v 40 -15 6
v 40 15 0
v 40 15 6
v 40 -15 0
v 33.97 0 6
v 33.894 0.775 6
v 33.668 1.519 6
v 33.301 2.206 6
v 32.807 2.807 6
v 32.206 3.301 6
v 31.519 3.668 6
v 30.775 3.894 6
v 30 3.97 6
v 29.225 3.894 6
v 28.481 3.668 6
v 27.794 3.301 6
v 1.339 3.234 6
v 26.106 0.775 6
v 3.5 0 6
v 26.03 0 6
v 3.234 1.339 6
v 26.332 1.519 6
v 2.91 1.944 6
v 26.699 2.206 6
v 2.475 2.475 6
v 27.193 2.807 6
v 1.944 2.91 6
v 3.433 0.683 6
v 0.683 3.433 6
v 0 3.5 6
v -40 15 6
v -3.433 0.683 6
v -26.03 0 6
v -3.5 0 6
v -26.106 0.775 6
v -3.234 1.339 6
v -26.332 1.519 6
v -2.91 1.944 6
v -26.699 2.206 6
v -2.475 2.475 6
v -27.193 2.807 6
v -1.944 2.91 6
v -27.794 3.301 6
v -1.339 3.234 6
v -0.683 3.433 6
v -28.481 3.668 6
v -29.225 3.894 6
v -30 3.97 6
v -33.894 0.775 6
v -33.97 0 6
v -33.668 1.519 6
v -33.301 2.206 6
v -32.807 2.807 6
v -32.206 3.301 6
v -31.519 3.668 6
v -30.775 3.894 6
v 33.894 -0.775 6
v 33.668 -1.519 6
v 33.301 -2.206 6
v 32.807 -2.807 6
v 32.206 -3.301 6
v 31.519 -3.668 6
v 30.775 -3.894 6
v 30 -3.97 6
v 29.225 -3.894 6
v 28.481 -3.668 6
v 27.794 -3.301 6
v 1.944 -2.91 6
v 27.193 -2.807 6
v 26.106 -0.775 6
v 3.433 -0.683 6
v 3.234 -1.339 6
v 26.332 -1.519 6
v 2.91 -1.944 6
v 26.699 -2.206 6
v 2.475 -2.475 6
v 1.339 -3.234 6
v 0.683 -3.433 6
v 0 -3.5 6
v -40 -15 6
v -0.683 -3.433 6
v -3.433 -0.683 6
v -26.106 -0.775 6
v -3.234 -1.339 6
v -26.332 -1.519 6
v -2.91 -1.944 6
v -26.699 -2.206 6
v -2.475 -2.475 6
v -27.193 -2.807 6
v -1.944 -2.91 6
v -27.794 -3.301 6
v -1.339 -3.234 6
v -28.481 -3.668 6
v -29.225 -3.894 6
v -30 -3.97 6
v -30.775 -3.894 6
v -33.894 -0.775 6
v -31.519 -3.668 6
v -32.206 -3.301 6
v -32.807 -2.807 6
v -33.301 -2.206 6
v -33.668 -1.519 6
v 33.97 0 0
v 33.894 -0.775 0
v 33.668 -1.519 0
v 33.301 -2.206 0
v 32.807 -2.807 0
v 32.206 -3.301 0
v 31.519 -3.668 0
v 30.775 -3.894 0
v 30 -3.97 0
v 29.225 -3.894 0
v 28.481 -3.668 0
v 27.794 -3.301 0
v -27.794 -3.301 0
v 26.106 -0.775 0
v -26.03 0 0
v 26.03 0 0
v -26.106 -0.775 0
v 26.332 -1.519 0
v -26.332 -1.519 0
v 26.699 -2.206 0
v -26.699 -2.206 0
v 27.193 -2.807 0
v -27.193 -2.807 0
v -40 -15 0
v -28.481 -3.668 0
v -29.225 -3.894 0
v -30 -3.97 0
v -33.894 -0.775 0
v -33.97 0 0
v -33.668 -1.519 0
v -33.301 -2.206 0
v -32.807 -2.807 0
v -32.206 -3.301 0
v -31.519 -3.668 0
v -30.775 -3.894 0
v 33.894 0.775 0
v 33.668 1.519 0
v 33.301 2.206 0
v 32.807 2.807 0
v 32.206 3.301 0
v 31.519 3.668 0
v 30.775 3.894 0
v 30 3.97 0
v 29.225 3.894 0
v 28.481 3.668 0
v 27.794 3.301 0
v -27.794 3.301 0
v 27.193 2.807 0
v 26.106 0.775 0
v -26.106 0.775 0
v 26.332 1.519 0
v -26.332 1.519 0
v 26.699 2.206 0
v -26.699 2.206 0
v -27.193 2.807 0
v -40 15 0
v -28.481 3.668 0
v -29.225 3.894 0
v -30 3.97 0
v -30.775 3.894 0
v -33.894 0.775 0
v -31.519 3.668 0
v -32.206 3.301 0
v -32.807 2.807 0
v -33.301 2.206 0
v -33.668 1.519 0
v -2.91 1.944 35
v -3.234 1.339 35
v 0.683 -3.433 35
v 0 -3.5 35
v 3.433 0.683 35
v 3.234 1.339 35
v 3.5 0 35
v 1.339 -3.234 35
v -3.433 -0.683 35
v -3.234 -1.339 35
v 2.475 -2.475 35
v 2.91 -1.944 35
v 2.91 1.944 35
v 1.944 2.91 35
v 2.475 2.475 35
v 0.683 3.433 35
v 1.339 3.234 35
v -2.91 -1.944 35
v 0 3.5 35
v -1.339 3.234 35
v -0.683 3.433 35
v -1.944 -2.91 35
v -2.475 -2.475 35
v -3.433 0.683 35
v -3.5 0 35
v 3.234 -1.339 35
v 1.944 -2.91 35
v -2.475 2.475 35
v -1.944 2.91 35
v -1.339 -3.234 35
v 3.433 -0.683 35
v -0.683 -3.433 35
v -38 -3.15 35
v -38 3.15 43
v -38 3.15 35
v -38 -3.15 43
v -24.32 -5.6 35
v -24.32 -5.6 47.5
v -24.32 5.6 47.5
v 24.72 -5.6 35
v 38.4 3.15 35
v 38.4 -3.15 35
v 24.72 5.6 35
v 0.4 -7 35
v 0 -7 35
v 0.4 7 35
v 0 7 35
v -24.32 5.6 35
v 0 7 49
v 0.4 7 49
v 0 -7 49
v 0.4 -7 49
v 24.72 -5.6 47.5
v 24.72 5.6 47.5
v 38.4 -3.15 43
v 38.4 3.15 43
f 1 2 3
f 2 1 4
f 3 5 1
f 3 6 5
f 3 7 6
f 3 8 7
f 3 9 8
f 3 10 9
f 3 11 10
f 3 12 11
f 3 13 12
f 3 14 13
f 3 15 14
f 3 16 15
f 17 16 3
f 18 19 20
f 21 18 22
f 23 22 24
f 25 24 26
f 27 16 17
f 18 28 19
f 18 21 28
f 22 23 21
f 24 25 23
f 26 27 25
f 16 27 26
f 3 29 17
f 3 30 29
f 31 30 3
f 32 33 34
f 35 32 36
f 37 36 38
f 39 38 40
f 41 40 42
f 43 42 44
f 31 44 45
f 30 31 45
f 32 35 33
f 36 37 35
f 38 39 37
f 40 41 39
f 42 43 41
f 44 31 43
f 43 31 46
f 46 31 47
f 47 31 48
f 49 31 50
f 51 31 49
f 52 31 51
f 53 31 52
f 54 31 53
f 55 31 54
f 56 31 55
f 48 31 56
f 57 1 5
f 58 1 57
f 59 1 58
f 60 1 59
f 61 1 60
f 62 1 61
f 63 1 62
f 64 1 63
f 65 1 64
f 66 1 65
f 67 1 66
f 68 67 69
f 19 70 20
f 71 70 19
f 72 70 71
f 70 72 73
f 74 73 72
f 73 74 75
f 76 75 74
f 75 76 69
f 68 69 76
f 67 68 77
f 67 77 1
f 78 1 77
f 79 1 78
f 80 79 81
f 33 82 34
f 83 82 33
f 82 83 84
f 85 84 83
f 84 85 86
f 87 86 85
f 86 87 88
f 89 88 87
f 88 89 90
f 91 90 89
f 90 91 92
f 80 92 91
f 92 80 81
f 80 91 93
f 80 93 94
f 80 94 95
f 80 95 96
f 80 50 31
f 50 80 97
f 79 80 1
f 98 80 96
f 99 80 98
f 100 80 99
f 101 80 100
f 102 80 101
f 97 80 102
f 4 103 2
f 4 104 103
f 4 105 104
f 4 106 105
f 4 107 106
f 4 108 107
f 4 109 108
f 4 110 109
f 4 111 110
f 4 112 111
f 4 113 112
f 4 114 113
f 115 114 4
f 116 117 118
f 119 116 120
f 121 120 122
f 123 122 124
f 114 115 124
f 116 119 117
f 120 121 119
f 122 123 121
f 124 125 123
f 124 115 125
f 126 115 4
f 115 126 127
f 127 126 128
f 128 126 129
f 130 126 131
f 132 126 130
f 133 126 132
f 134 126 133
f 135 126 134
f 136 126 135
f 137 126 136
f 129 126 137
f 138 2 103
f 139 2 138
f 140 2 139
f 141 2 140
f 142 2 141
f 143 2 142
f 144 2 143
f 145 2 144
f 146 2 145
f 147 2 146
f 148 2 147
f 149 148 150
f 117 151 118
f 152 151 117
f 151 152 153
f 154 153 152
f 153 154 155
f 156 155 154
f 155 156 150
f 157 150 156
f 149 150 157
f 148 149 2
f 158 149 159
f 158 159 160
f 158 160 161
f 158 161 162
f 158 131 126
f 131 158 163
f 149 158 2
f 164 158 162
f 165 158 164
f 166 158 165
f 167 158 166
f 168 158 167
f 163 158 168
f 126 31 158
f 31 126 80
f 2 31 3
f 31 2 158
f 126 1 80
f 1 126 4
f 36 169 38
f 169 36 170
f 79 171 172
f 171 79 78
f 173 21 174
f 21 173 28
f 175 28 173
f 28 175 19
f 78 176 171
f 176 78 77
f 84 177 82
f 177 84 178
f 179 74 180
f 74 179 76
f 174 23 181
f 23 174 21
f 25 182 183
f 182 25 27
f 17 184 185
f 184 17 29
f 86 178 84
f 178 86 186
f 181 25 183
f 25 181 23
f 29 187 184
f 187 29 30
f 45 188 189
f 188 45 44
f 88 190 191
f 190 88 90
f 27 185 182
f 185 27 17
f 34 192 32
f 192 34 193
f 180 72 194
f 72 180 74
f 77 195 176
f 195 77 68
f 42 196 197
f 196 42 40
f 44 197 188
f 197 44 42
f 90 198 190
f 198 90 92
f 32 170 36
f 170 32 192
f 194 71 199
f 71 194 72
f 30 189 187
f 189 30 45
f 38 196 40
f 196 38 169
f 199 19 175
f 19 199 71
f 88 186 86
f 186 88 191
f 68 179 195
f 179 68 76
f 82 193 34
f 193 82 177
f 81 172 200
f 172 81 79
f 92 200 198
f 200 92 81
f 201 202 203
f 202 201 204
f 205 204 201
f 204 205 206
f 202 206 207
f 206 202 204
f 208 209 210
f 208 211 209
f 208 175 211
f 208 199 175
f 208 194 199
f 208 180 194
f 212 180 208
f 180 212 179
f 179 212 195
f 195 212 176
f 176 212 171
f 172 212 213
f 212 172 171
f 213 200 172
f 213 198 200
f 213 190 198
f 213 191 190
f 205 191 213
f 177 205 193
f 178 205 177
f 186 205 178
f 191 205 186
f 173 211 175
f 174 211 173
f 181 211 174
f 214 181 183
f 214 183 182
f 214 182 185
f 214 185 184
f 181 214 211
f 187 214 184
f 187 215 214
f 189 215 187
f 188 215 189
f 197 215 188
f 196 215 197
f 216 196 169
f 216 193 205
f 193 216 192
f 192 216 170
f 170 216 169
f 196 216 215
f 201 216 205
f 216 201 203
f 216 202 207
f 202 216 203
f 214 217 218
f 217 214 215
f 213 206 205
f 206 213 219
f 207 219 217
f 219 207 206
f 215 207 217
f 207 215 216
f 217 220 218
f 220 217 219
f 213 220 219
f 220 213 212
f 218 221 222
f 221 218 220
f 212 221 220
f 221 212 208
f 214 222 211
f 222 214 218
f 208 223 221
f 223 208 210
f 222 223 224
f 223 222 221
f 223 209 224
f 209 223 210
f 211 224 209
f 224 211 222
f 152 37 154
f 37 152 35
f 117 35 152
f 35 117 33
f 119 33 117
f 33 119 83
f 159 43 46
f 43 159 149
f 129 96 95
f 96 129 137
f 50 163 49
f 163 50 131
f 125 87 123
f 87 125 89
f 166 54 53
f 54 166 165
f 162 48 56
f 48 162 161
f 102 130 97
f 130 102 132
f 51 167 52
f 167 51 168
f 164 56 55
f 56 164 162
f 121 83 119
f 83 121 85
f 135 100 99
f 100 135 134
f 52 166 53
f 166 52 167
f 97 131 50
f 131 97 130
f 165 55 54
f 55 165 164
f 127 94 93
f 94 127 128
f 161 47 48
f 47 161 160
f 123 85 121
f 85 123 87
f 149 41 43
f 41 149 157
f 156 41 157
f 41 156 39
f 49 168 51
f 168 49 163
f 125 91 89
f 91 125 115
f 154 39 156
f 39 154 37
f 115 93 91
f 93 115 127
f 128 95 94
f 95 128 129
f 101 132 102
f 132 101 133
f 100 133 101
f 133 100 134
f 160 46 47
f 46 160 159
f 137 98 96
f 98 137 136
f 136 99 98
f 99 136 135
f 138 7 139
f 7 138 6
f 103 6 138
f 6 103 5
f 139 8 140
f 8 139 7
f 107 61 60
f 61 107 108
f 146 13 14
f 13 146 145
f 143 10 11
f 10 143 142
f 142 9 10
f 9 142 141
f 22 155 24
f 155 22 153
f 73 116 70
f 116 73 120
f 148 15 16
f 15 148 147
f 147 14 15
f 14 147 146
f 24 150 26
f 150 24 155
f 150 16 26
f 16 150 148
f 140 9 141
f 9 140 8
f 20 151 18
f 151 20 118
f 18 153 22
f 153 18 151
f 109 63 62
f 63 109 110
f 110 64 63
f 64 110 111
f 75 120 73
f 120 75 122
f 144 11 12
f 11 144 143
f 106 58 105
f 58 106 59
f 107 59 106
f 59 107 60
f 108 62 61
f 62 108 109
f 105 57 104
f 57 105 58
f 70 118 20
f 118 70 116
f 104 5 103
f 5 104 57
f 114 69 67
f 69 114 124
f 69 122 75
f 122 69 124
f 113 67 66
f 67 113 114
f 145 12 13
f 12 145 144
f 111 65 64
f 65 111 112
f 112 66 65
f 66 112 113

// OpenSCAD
$fn = 32;

// ----------------------------------------------------------------------
// Boat cleat: 80 mm base, horn 42 mm up
// ----------------------------------------------------------------------

// --- parameters (mm) ---
base_l = 80;              // base length
base_w = 30;              // base width
base_t = 6;               // base thickness
horn_len = 76;            // horn length
horn_d = 14;              // horn diameter at the middle
horn_z = 42;              // horn axis height
end_drop = 6;             // how far the horn tips drop
post_d = 7;               // centre post diameter
holes_d = 7.94;           // fixing holes
hole_x = 30;              // fixing hole spacing

difference() {
  union() {
    translate([-40, -15, 0]) cube([base_l, base_w, base_t]);
    /* centre post, sunk 1 mm into the base */
    translate([0, 0, 5]) cylinder(h = 37, d = post_d);
    /* horn: a hull chain of boxes, full in the middle and lighter at the tips */
    hull() {
      translate([-38, -3.15, 35]) cube([0.4, 6.3, 8], center = false);
      translate([-24.32, -5.6, 35]) cube([0.4, 11.2, 12.5], center = false);
    }
    hull() {
      translate([-24.32, -5.6, 35]) cube([0.4, 11.2, 12.5], center = false);
      translate([0, -7, 35]) cube([0.4, 14, 14], center = false);
    }
    hull() {
      translate([0, -7, 35]) cube([0.4, 14, 14], center = false);
      translate([24.32, -5.6, 35]) cube([0.4, 11.2, 12.5], center = false);
    }
    hull() {
      translate([24.32, -5.6, 35]) cube([0.4, 11.2, 12.5], center = false);
      translate([38, -3.15, 35]) cube([0.4, 6.3, 8], center = false);
    }
  }
  translate([-30, 0, -2.5]) cylinder(h = base_t + 5, d = holes_d);
  translate([30, 0, -2.5]) cylinder(h = base_t + 5, d = holes_d);
}
